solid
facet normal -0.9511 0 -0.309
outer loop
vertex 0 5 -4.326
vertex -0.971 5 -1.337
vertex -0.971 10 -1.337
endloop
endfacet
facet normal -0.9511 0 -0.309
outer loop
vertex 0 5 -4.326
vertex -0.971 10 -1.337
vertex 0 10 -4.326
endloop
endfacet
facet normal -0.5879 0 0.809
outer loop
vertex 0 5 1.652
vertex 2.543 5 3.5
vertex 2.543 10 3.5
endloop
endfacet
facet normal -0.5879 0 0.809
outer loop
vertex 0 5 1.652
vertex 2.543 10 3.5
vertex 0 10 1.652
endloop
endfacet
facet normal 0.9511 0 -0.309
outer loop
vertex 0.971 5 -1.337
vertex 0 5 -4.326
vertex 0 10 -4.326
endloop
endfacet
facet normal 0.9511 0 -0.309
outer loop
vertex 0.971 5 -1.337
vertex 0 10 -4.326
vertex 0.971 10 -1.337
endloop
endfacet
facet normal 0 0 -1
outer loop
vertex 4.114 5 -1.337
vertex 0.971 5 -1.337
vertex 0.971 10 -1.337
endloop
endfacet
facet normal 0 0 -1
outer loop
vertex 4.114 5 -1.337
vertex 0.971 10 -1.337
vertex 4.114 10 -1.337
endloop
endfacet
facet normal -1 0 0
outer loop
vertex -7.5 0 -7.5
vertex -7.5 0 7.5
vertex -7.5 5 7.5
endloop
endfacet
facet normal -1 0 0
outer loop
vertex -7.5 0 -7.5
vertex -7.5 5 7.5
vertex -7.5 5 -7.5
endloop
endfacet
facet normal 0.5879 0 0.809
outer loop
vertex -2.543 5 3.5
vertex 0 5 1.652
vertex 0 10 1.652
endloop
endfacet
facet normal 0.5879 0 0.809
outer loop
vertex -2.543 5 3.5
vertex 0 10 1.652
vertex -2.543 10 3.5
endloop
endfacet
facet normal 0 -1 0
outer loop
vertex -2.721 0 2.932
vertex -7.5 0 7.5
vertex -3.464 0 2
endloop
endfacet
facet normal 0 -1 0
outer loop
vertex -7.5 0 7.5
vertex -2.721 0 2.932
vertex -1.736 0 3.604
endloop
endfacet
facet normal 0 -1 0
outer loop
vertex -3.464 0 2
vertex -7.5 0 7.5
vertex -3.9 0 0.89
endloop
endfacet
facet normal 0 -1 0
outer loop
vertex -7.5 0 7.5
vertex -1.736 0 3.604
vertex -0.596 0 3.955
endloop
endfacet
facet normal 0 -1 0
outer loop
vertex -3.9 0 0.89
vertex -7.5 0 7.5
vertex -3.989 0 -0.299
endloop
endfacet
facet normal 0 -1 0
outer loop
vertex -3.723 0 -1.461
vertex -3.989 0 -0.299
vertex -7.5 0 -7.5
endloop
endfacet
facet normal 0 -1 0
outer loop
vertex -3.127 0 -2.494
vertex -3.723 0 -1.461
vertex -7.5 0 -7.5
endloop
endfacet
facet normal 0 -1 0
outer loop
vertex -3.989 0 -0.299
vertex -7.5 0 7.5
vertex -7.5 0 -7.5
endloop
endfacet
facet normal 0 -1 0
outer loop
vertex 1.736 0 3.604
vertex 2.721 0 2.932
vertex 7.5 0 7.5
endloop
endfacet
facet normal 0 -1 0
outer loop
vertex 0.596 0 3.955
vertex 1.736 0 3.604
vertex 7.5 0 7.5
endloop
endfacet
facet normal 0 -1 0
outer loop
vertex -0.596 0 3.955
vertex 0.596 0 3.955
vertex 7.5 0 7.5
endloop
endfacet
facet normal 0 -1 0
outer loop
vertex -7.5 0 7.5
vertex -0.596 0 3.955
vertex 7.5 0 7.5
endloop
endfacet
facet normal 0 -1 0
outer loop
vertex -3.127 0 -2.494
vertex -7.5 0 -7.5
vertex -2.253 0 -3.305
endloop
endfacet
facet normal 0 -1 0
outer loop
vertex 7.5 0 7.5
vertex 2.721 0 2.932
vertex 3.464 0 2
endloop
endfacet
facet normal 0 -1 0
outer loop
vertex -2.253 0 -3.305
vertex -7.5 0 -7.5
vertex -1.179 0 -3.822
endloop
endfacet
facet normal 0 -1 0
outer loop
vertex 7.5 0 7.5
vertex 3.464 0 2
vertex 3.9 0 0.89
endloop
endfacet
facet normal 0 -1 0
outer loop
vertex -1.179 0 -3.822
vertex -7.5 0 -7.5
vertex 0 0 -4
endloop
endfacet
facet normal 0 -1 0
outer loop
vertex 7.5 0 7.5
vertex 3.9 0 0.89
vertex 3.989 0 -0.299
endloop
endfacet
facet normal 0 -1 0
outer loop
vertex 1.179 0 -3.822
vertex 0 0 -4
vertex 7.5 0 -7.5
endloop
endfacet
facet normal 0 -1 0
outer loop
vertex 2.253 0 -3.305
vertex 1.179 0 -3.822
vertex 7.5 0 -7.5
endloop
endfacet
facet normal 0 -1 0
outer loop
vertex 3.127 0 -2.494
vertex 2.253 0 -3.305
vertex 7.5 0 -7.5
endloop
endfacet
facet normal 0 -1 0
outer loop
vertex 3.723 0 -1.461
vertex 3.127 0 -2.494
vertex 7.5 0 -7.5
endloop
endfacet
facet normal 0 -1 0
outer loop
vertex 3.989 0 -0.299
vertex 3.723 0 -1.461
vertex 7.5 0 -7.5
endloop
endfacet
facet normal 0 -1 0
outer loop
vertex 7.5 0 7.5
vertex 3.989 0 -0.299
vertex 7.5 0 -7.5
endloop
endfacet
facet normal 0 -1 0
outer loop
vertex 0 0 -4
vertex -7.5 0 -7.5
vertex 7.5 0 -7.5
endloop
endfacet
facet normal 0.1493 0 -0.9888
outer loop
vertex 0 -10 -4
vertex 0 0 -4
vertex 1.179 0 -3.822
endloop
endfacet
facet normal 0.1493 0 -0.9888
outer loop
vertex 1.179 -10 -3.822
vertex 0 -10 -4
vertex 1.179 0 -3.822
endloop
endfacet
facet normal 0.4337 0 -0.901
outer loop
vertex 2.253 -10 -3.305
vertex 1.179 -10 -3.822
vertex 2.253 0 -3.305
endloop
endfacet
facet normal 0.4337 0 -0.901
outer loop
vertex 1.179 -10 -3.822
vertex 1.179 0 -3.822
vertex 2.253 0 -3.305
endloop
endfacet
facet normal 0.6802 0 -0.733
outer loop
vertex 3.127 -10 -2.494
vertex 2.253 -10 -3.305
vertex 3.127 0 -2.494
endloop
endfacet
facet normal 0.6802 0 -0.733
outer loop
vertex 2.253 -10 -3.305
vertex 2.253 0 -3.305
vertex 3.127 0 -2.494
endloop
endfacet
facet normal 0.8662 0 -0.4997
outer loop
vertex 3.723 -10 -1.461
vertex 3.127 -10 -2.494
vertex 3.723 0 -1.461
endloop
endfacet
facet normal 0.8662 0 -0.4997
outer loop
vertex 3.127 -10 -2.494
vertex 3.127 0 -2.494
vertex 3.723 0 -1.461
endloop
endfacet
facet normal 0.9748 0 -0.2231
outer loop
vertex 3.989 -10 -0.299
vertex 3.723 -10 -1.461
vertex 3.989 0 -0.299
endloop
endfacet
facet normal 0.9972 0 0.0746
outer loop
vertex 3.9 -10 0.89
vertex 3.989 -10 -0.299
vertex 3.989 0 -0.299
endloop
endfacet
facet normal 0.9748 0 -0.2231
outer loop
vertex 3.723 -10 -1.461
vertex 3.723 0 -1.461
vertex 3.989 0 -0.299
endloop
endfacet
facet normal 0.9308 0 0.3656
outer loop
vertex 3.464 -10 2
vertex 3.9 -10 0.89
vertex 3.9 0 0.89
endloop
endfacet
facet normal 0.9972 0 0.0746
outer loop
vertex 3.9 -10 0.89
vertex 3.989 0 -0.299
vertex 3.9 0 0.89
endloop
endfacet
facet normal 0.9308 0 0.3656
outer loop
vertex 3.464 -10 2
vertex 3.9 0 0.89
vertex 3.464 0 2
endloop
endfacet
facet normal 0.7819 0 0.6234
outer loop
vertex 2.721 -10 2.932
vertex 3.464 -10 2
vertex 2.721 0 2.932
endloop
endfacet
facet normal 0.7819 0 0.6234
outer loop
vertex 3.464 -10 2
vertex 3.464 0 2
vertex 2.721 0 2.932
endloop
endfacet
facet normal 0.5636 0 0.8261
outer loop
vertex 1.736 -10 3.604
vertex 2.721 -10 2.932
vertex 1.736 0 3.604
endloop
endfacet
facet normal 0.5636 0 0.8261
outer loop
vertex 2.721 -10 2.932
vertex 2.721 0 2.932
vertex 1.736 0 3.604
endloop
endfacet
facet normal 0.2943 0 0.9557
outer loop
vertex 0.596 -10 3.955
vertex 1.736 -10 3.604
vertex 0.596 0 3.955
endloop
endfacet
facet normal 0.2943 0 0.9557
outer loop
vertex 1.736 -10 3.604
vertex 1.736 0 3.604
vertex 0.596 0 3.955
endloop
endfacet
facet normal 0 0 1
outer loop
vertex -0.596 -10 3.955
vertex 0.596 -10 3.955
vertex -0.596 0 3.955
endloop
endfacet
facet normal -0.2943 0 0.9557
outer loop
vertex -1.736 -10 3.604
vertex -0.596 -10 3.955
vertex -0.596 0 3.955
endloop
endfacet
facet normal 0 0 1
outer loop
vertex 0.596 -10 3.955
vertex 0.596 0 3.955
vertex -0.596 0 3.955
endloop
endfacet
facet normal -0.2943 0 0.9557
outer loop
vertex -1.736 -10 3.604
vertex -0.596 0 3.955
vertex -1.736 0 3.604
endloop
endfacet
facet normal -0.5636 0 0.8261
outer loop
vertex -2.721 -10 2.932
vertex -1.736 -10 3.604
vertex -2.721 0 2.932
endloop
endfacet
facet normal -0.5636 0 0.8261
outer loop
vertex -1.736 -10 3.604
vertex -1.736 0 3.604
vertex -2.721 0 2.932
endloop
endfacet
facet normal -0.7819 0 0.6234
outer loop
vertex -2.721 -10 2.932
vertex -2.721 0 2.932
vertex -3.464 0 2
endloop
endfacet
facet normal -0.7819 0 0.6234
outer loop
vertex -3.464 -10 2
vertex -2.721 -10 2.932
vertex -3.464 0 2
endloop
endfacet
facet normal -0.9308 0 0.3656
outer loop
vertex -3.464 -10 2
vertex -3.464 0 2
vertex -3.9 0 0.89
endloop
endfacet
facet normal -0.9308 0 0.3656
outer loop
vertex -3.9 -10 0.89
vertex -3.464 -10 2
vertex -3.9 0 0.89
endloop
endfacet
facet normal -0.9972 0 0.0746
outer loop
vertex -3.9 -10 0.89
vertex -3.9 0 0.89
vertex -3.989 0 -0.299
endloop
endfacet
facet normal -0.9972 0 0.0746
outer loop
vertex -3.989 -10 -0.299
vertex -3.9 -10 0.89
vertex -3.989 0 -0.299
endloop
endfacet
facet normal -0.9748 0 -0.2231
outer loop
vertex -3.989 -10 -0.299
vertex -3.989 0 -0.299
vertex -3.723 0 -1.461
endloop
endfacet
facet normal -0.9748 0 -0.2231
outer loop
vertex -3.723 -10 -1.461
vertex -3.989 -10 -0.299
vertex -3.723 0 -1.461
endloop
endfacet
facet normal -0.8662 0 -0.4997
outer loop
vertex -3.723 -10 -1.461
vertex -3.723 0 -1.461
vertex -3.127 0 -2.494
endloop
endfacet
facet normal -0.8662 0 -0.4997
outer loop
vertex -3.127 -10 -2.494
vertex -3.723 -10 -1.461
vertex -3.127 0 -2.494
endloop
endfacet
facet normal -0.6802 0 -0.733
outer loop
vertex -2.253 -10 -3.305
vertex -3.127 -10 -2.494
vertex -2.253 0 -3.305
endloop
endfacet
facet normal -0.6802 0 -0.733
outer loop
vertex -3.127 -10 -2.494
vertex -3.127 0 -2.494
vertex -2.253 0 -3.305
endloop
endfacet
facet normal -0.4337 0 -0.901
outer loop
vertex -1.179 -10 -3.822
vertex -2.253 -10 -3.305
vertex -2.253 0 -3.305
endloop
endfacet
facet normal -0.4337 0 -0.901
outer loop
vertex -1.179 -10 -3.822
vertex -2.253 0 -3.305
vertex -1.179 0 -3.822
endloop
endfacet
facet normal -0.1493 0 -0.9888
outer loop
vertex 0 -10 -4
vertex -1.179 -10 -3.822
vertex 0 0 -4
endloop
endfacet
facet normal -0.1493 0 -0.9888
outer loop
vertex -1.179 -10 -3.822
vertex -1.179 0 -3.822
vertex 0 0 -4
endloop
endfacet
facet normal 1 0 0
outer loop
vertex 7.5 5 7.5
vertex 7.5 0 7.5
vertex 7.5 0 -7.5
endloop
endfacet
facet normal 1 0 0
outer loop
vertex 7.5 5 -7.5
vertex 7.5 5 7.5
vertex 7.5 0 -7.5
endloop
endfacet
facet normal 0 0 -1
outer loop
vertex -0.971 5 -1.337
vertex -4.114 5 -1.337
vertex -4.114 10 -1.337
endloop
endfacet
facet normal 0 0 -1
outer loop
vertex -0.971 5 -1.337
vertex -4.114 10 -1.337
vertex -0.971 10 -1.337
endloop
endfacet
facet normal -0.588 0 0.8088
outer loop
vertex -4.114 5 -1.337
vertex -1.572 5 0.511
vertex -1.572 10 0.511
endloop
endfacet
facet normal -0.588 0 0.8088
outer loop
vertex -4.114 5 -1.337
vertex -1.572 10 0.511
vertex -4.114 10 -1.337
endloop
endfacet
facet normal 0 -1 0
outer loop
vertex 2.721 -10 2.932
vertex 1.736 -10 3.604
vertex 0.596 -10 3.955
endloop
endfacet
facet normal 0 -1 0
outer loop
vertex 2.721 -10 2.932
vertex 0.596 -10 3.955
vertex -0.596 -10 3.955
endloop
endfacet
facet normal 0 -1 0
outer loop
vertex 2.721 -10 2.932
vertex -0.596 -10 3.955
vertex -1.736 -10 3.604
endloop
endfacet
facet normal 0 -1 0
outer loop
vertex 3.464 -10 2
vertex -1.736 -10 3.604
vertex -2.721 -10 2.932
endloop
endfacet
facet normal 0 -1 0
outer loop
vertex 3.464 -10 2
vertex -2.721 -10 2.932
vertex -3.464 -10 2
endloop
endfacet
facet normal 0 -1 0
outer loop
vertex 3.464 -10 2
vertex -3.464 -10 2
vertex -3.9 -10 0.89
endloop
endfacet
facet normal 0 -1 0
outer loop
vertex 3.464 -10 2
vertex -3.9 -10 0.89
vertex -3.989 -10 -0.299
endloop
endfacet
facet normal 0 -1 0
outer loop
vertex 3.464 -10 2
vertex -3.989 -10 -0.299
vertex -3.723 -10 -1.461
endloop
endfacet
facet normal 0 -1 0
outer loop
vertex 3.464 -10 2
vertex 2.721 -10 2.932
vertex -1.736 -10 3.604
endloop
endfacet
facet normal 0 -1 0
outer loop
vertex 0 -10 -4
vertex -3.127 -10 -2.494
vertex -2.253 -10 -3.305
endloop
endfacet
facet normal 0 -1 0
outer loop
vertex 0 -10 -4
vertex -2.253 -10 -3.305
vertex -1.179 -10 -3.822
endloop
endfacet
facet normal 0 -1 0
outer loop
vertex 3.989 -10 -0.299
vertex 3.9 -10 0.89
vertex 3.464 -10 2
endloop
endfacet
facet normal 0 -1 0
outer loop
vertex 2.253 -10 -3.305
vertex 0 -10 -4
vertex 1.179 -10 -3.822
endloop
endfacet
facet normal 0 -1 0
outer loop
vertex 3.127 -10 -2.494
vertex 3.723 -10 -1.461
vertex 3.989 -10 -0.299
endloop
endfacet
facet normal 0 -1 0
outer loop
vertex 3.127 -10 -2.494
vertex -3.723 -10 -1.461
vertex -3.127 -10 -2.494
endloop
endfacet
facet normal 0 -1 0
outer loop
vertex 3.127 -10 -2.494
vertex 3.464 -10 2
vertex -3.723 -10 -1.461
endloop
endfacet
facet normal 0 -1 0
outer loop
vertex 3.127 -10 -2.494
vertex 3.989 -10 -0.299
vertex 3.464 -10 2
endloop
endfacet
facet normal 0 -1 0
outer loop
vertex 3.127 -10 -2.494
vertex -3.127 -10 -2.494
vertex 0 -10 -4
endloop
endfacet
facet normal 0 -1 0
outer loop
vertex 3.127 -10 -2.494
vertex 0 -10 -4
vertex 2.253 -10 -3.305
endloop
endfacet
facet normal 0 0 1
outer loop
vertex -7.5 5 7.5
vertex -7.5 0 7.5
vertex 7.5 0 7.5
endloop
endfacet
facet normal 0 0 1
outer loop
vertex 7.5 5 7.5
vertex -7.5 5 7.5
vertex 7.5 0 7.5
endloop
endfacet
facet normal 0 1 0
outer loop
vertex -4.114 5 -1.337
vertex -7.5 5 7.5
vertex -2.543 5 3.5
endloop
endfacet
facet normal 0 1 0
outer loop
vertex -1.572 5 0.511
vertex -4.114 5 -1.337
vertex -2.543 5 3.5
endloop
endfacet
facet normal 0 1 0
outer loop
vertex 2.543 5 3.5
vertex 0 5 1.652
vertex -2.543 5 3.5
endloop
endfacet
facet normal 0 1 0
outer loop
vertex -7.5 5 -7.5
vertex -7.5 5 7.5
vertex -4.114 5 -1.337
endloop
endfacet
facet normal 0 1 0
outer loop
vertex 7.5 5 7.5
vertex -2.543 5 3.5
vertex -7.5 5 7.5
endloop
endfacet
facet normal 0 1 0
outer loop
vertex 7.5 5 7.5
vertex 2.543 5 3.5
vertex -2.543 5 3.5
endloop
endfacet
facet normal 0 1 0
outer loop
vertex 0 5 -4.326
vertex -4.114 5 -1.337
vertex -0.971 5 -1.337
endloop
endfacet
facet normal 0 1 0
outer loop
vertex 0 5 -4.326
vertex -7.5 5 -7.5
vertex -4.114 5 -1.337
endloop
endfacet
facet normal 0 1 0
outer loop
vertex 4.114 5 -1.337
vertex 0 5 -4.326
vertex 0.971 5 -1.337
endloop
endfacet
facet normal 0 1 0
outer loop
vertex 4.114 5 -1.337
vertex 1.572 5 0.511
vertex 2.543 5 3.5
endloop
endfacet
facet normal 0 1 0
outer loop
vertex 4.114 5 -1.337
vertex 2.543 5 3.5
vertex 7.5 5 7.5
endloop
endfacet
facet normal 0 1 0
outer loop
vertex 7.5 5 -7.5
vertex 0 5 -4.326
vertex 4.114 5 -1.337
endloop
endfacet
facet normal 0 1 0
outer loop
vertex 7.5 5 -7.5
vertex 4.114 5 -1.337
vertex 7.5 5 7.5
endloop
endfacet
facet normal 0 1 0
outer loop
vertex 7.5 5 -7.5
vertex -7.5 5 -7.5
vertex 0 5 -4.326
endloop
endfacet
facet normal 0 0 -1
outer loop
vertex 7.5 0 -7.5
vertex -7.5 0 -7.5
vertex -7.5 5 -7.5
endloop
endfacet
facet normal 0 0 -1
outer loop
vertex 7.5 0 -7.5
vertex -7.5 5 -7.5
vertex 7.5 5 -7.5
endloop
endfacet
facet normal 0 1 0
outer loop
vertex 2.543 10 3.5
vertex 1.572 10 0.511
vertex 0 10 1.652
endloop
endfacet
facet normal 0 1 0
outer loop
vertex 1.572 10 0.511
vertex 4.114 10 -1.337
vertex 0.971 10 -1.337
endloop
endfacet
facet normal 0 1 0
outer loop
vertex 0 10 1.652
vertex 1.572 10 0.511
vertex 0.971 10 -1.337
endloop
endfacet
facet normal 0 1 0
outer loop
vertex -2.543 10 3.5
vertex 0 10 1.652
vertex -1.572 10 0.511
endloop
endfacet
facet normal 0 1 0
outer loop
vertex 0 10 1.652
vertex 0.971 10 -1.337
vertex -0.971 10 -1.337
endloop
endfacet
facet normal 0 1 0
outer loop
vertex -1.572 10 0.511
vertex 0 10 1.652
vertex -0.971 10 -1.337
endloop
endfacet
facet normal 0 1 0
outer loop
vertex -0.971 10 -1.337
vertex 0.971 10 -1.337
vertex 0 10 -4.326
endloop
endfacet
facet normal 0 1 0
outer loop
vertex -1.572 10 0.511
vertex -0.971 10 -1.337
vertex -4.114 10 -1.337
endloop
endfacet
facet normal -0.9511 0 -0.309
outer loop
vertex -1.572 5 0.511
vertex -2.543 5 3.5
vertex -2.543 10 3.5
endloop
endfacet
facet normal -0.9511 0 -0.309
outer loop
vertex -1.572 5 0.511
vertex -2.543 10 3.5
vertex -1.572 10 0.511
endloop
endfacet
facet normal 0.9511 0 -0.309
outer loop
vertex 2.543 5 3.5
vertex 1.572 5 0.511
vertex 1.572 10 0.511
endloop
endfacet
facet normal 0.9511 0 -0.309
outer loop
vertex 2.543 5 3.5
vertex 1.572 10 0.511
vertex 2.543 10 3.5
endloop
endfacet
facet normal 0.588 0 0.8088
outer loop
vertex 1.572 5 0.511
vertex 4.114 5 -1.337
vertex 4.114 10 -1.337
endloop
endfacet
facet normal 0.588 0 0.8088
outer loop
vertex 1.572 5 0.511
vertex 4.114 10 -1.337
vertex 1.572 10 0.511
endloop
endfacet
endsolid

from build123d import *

# Parameters (mm, degrees)
SKETCH1_W           = 15
SKETCH1_H           = 15
BOSS_EXTRUDE1_DEPTH = 5
SKETCH5_R           = 4
BOSS_EXTRUDE3_DEPTH = 10
BOSS_EXTRUDE4_DEPTH = 5


with BuildPart() as part:
    # Sketch1 → Boss-Extrude1 (new body)
    with BuildSketch(Plane(origin=(0, 0, 0), x_dir=(1, 0, 0), z_dir=(0, 1, 0))):
        Rectangle(SKETCH1_W, SKETCH1_H)
    extrude(amount=BOSS_EXTRUDE1_DEPTH)

    # Sketch5 → Boss-Extrude3 (add)
    with BuildSketch(Plane.XZ):
        with Locations(Location((0, 0, 0), (0, 0, 270))):
            Circle(SKETCH5_R)
    extrude(amount=BOSS_EXTRUDE3_DEPTH)

    # Sketch6 → Boss-Extrude4 (add)
    with BuildSketch(Plane(origin=(0, 5, 0), x_dir=(1, 0, 0), z_dir=(0, 1, 0))):
        Polygon((-2.542898848, -3.5), (-1.571597918, -0.510643118), (-4.114496766, 1.336881039), (-0.97130093, 1.336881039), (0, 4.326237921), (0.97130093, 1.336881039), (4.114496766, 1.336881039), (1.571597918, -0.510643118), (2.542898848, -3.5), (0, -1.652475842), align=None)
    extrude(amount=BOSS_EXTRUDE4_DEPTH)


solid = part.part
